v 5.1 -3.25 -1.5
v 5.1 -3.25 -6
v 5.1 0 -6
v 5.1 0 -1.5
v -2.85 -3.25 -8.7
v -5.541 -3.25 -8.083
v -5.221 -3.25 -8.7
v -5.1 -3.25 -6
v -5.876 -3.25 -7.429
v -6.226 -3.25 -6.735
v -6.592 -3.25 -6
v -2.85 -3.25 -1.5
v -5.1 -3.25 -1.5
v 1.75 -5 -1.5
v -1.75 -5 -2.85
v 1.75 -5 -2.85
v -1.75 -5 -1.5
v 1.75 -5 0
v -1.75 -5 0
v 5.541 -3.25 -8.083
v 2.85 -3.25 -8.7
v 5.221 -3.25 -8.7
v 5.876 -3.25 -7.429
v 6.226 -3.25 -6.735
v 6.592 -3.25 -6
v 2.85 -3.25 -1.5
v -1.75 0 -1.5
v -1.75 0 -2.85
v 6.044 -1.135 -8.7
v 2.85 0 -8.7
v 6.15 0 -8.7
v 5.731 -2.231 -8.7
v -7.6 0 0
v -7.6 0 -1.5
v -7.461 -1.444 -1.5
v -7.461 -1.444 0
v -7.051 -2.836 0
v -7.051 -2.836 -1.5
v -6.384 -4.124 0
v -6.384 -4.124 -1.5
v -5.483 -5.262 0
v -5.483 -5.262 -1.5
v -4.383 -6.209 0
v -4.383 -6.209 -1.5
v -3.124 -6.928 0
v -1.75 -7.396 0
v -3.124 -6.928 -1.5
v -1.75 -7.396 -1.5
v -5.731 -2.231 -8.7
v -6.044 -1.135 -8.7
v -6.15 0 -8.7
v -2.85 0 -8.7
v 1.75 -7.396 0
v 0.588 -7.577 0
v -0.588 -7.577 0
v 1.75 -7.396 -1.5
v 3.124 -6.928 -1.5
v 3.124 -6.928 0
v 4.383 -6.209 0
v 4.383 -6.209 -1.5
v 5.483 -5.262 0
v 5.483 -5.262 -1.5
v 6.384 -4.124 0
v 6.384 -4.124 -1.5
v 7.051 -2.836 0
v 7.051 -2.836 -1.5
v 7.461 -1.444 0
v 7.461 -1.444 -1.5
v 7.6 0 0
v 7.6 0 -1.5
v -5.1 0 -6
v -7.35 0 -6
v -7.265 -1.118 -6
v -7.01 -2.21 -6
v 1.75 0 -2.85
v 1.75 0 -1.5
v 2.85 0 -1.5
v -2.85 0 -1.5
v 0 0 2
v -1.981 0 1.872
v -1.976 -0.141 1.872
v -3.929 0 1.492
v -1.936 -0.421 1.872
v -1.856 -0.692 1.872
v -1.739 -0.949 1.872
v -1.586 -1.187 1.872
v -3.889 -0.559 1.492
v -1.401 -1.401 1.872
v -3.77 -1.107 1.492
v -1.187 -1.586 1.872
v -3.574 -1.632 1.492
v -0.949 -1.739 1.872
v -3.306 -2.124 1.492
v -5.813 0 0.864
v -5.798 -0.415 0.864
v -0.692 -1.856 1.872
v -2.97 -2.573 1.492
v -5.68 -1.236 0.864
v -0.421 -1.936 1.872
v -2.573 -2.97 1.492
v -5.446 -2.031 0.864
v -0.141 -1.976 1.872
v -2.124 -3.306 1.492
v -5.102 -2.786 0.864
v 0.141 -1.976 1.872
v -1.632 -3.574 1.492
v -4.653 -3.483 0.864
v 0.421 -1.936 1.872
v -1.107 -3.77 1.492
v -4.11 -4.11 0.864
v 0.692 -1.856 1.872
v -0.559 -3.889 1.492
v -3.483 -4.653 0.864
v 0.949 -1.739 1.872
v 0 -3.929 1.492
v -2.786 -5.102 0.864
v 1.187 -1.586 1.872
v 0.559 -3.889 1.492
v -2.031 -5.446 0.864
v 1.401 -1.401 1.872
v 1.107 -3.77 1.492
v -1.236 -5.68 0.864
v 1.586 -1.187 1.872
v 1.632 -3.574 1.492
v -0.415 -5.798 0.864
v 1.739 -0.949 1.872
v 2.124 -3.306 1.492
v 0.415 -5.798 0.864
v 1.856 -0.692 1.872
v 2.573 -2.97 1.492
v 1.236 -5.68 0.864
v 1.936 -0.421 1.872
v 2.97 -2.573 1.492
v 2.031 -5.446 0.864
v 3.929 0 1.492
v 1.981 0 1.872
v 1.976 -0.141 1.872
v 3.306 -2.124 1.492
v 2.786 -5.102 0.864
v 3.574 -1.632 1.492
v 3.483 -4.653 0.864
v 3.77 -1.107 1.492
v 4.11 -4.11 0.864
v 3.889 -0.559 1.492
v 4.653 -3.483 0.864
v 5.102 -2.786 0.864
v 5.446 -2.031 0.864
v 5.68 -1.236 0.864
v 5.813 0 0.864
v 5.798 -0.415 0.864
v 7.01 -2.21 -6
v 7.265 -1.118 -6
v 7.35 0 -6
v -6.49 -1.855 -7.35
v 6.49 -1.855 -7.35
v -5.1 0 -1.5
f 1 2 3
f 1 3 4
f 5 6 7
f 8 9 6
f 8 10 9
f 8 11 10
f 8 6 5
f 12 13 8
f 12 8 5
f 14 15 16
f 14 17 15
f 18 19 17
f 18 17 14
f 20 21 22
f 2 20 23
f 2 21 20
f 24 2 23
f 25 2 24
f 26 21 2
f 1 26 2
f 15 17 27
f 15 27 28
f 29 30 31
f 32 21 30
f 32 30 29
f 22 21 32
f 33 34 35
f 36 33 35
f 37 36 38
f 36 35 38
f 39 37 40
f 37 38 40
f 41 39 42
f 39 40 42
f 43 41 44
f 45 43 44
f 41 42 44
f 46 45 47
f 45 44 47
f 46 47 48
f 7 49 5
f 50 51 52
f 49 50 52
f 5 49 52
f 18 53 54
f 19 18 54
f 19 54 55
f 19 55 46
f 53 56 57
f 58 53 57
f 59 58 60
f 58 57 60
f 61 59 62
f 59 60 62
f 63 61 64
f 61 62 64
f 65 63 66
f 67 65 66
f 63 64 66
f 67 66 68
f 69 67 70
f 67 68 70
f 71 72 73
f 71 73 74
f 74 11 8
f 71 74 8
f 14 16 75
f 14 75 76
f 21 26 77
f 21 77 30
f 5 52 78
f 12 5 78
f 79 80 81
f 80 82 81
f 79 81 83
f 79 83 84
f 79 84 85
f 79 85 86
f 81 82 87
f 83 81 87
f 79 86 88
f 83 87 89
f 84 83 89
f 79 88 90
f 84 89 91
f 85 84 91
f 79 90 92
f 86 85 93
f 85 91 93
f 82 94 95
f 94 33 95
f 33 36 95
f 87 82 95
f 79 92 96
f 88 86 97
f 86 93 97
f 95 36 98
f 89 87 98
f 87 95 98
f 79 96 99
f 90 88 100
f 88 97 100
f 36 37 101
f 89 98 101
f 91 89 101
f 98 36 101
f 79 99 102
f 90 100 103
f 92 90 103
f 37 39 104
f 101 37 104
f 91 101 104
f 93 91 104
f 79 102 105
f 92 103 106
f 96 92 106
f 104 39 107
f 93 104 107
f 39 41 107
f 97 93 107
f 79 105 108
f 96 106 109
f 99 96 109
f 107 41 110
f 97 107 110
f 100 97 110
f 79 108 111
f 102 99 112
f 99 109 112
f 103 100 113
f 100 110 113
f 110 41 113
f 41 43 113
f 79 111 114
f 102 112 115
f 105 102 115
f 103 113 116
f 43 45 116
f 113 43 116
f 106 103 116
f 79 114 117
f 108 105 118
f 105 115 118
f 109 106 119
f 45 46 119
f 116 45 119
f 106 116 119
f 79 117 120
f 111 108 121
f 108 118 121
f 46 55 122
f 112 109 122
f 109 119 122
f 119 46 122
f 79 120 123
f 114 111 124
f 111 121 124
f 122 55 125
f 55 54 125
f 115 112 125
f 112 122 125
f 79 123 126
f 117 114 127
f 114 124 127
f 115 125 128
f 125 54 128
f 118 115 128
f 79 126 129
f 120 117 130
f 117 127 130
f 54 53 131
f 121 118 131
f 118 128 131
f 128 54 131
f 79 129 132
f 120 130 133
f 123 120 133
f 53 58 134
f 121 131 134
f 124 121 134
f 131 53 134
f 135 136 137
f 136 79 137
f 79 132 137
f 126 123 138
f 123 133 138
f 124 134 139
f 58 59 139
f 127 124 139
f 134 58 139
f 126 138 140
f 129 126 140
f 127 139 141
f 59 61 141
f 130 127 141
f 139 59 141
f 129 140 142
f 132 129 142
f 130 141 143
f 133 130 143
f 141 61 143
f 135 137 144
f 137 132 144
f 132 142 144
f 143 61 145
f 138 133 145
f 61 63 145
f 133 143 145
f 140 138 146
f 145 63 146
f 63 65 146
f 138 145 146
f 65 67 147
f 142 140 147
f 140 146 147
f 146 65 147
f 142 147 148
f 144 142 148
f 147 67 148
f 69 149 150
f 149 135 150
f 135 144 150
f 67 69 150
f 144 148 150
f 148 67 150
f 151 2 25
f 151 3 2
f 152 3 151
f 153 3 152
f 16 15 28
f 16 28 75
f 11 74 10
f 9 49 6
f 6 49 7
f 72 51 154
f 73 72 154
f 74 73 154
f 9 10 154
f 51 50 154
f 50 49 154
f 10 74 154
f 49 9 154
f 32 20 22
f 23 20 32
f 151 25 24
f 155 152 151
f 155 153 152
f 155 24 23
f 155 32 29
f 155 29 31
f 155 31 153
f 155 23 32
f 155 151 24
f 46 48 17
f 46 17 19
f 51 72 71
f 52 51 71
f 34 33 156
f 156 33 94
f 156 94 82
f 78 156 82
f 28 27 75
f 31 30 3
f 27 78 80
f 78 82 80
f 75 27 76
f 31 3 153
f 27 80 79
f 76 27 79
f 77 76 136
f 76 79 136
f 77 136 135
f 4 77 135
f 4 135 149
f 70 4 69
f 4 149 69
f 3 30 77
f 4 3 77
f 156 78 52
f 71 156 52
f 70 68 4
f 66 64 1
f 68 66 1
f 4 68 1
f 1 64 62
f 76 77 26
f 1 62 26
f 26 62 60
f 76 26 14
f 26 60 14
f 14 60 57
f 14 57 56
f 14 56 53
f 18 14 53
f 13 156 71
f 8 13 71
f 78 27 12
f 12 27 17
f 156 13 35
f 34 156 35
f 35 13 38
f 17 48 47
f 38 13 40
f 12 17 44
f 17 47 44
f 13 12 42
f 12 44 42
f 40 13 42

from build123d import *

# Parameters (mm, degrees)
F0_W          = 1.75
F0_H          = 1.5
F0_W_2        = 2.25
F0_H_2        = 4.5
F0_H_3        = 2.7
F2_DEPTH      = 3.25
F3_ANGLE_BACK = 35
F3_ANGLE      = 70
F4_DEPTH      = 12.5
F5_DEPTH      = 5
F6_START      = 3.25
F6_DEPTH      = 4.351
F7_DEPTH      = 7.601


with BuildPart() as f1:
    # F0 (on Front) → F1 (revolve)
    with BuildSketch(Plane.XZ):
        Polygon((-1.75, 0), (-7.6, 0), (-7.6, -1.5), (-5.1, -1.5), (-2.85, -1.5), (-1.75, -1.5), align=None)
        with BuildLine():
            ThreePointArc((0, 2), (-3.9293765409, 1.4916308553), (-7.6, 0))
            Line((-7.6, 0), (-1.75, 0))
            Line((-1.75, 0), (0, 0))
            Line((0, 0), (0, 2))
        make_face()
        with Locations((-0.875, -0.75)):
            Rectangle(F0_W, F0_H)
    revolve(axis=Axis((0, 0, 1), (0, 0, 1)))

    # F0 (on Front) → F2 (join, symmetric)
    with BuildSketch(Plane.XZ):
        with Locations((-3.975, -3.75)):
            Rectangle(F0_W_2, F0_H_2)
        with Locations((-3.975, -7.35)):
            Rectangle(F0_W_2, F0_H_3)
        with Locations((3.975, -7.35)):
            Rectangle(F0_W_2, F0_H_3)
        with Locations((3.975, -3.75)):
            Rectangle(F0_W_2, F0_H_2)
    extrude(amount=F2_DEPTH, both=True)

    # F0 (on Front) → F3 (revolve)
    with BuildSketch(Plane.XZ, mode=Mode.PRIVATE) as f3_sk:
        Polygon((-5.1, -8.7), (-5.1, -6), (-7.35, -6), (-6.15, -8.7), align=None)
        Polygon((7.35, -6), (5.1, -6), (5.1, -8.7), (6.15, -8.7), align=None)
    revolve(f3_sk.sketch.rotate(Axis((0, 0, 1), (0, 0, 1)), -F3_ANGLE_BACK), axis=Axis((0, 0, 1), (0, 0, 1)), revolution_arc=F3_ANGLE)

    # F0 (on Front) → F4 (cut, symmetric)
    with BuildSketch(Plane.XZ):
        with Locations((-0.875, -0.75)):
            Rectangle(F0_W, F0_H)
        with Locations((0.875, -0.75)):
            Rectangle(F0_W, F0_H)
    extrude(amount=F4_DEPTH, both=True, mode=Mode.SUBTRACT)

    # F0 (on Front) → F5 (join, symmetric)
    with BuildSketch(Plane.XZ):
        Polygon((0, -1.5), (-1.75, -1.5), (-1.75, -2.85), (1.75, -2.85), (1.75, -1.5), align=None)
        with Locations((-0.875, -0.75)):
            Rectangle(F0_W, F0_H)
        with Locations((0.875, -0.75)):
            Rectangle(F0_W, F0_H)
    extrude(amount=F5_DEPTH, both=True)

    # F0 (on Front) → F6 (cut)
    with BuildSketch(Plane.XZ.offset(F6_START)):
        Polygon((-5.1, -8.7), (-5.1, -6), (-7.35, -6), (-6.15, -8.7), align=None)
        with Locations((-3.975, -7.35)):
            Rectangle(F0_W_2, F0_H_3)
        with Locations((3.975, -7.35)):
            Rectangle(F0_W_2, F0_H_3)
        Polygon((7.35, -6), (5.1, -6), (5.1, -8.7), (6.15, -8.7), align=None)
    extrude(amount=F6_DEPTH, mode=Mode.SUBTRACT)

    # F0 (on Front) → F7 (cut, through all)
    with BuildSketch(Plane.XZ):
        Polygon((7.35, -6), (5.1, -6), (5.1, -8.7), (6.15, -8.7), align=None)
        Polygon((-5.1, -8.7), (-5.1, -6), (-7.35, -6), (-6.15, -8.7), align=None)
        Polygon((0, -1.5), (-1.75, -1.5), (-1.75, -2.85), (1.75, -2.85), (1.75, -1.5), align=None)
        with Locations((3.975, -3.75)):
            Rectangle(F0_W_2, F0_H_2)
        with Locations((3.975, -7.35)):
            Rectangle(F0_W_2, F0_H_3)
        with Locations((-3.975, -3.75)):
            Rectangle(F0_W_2, F0_H_2)
        with Locations((-3.975, -7.35)):
            Rectangle(F0_W_2, F0_H_3)
        with BuildLine():
            ThreePointArc((7.6, 0), (3.9293765409, 1.4916308553), (0, 2))
            Line((0, 2), (0, 0))
            Line((0, 0), (1.75, 0))
            Line((1.75, 0), (7.6, 0))
        make_face()
        with BuildLine():
            ThreePointArc((0, 2), (-3.9293765409, 1.4916308553), (-7.6, 0))
            Line((-7.6, 0), (-1.75, 0))
            Line((-1.75, 0), (0, 0))
            Line((0, 0), (0, 2))
        make_face()
        Polygon((-1.75, 0), (-7.6, 0), (-7.6, -1.5), (-5.1, -1.5), (-2.85, -1.5), (-1.75, -1.5), align=None)
        Polygon((7.6, -1.5), (7.6, 0), (1.75, 0), (1.75, -1.5), (2.85, -1.5), (5.1, -1.5), align=None)
        with Locations((-0.875, -0.75)):
            Rectangle(F0_W, F0_H)
        with Locations((0.875, -0.75)):
            Rectangle(F0_W, F0_H)
    extrude(amount=-F7_DEPTH, mode=Mode.SUBTRACT)


solid = f1.part
